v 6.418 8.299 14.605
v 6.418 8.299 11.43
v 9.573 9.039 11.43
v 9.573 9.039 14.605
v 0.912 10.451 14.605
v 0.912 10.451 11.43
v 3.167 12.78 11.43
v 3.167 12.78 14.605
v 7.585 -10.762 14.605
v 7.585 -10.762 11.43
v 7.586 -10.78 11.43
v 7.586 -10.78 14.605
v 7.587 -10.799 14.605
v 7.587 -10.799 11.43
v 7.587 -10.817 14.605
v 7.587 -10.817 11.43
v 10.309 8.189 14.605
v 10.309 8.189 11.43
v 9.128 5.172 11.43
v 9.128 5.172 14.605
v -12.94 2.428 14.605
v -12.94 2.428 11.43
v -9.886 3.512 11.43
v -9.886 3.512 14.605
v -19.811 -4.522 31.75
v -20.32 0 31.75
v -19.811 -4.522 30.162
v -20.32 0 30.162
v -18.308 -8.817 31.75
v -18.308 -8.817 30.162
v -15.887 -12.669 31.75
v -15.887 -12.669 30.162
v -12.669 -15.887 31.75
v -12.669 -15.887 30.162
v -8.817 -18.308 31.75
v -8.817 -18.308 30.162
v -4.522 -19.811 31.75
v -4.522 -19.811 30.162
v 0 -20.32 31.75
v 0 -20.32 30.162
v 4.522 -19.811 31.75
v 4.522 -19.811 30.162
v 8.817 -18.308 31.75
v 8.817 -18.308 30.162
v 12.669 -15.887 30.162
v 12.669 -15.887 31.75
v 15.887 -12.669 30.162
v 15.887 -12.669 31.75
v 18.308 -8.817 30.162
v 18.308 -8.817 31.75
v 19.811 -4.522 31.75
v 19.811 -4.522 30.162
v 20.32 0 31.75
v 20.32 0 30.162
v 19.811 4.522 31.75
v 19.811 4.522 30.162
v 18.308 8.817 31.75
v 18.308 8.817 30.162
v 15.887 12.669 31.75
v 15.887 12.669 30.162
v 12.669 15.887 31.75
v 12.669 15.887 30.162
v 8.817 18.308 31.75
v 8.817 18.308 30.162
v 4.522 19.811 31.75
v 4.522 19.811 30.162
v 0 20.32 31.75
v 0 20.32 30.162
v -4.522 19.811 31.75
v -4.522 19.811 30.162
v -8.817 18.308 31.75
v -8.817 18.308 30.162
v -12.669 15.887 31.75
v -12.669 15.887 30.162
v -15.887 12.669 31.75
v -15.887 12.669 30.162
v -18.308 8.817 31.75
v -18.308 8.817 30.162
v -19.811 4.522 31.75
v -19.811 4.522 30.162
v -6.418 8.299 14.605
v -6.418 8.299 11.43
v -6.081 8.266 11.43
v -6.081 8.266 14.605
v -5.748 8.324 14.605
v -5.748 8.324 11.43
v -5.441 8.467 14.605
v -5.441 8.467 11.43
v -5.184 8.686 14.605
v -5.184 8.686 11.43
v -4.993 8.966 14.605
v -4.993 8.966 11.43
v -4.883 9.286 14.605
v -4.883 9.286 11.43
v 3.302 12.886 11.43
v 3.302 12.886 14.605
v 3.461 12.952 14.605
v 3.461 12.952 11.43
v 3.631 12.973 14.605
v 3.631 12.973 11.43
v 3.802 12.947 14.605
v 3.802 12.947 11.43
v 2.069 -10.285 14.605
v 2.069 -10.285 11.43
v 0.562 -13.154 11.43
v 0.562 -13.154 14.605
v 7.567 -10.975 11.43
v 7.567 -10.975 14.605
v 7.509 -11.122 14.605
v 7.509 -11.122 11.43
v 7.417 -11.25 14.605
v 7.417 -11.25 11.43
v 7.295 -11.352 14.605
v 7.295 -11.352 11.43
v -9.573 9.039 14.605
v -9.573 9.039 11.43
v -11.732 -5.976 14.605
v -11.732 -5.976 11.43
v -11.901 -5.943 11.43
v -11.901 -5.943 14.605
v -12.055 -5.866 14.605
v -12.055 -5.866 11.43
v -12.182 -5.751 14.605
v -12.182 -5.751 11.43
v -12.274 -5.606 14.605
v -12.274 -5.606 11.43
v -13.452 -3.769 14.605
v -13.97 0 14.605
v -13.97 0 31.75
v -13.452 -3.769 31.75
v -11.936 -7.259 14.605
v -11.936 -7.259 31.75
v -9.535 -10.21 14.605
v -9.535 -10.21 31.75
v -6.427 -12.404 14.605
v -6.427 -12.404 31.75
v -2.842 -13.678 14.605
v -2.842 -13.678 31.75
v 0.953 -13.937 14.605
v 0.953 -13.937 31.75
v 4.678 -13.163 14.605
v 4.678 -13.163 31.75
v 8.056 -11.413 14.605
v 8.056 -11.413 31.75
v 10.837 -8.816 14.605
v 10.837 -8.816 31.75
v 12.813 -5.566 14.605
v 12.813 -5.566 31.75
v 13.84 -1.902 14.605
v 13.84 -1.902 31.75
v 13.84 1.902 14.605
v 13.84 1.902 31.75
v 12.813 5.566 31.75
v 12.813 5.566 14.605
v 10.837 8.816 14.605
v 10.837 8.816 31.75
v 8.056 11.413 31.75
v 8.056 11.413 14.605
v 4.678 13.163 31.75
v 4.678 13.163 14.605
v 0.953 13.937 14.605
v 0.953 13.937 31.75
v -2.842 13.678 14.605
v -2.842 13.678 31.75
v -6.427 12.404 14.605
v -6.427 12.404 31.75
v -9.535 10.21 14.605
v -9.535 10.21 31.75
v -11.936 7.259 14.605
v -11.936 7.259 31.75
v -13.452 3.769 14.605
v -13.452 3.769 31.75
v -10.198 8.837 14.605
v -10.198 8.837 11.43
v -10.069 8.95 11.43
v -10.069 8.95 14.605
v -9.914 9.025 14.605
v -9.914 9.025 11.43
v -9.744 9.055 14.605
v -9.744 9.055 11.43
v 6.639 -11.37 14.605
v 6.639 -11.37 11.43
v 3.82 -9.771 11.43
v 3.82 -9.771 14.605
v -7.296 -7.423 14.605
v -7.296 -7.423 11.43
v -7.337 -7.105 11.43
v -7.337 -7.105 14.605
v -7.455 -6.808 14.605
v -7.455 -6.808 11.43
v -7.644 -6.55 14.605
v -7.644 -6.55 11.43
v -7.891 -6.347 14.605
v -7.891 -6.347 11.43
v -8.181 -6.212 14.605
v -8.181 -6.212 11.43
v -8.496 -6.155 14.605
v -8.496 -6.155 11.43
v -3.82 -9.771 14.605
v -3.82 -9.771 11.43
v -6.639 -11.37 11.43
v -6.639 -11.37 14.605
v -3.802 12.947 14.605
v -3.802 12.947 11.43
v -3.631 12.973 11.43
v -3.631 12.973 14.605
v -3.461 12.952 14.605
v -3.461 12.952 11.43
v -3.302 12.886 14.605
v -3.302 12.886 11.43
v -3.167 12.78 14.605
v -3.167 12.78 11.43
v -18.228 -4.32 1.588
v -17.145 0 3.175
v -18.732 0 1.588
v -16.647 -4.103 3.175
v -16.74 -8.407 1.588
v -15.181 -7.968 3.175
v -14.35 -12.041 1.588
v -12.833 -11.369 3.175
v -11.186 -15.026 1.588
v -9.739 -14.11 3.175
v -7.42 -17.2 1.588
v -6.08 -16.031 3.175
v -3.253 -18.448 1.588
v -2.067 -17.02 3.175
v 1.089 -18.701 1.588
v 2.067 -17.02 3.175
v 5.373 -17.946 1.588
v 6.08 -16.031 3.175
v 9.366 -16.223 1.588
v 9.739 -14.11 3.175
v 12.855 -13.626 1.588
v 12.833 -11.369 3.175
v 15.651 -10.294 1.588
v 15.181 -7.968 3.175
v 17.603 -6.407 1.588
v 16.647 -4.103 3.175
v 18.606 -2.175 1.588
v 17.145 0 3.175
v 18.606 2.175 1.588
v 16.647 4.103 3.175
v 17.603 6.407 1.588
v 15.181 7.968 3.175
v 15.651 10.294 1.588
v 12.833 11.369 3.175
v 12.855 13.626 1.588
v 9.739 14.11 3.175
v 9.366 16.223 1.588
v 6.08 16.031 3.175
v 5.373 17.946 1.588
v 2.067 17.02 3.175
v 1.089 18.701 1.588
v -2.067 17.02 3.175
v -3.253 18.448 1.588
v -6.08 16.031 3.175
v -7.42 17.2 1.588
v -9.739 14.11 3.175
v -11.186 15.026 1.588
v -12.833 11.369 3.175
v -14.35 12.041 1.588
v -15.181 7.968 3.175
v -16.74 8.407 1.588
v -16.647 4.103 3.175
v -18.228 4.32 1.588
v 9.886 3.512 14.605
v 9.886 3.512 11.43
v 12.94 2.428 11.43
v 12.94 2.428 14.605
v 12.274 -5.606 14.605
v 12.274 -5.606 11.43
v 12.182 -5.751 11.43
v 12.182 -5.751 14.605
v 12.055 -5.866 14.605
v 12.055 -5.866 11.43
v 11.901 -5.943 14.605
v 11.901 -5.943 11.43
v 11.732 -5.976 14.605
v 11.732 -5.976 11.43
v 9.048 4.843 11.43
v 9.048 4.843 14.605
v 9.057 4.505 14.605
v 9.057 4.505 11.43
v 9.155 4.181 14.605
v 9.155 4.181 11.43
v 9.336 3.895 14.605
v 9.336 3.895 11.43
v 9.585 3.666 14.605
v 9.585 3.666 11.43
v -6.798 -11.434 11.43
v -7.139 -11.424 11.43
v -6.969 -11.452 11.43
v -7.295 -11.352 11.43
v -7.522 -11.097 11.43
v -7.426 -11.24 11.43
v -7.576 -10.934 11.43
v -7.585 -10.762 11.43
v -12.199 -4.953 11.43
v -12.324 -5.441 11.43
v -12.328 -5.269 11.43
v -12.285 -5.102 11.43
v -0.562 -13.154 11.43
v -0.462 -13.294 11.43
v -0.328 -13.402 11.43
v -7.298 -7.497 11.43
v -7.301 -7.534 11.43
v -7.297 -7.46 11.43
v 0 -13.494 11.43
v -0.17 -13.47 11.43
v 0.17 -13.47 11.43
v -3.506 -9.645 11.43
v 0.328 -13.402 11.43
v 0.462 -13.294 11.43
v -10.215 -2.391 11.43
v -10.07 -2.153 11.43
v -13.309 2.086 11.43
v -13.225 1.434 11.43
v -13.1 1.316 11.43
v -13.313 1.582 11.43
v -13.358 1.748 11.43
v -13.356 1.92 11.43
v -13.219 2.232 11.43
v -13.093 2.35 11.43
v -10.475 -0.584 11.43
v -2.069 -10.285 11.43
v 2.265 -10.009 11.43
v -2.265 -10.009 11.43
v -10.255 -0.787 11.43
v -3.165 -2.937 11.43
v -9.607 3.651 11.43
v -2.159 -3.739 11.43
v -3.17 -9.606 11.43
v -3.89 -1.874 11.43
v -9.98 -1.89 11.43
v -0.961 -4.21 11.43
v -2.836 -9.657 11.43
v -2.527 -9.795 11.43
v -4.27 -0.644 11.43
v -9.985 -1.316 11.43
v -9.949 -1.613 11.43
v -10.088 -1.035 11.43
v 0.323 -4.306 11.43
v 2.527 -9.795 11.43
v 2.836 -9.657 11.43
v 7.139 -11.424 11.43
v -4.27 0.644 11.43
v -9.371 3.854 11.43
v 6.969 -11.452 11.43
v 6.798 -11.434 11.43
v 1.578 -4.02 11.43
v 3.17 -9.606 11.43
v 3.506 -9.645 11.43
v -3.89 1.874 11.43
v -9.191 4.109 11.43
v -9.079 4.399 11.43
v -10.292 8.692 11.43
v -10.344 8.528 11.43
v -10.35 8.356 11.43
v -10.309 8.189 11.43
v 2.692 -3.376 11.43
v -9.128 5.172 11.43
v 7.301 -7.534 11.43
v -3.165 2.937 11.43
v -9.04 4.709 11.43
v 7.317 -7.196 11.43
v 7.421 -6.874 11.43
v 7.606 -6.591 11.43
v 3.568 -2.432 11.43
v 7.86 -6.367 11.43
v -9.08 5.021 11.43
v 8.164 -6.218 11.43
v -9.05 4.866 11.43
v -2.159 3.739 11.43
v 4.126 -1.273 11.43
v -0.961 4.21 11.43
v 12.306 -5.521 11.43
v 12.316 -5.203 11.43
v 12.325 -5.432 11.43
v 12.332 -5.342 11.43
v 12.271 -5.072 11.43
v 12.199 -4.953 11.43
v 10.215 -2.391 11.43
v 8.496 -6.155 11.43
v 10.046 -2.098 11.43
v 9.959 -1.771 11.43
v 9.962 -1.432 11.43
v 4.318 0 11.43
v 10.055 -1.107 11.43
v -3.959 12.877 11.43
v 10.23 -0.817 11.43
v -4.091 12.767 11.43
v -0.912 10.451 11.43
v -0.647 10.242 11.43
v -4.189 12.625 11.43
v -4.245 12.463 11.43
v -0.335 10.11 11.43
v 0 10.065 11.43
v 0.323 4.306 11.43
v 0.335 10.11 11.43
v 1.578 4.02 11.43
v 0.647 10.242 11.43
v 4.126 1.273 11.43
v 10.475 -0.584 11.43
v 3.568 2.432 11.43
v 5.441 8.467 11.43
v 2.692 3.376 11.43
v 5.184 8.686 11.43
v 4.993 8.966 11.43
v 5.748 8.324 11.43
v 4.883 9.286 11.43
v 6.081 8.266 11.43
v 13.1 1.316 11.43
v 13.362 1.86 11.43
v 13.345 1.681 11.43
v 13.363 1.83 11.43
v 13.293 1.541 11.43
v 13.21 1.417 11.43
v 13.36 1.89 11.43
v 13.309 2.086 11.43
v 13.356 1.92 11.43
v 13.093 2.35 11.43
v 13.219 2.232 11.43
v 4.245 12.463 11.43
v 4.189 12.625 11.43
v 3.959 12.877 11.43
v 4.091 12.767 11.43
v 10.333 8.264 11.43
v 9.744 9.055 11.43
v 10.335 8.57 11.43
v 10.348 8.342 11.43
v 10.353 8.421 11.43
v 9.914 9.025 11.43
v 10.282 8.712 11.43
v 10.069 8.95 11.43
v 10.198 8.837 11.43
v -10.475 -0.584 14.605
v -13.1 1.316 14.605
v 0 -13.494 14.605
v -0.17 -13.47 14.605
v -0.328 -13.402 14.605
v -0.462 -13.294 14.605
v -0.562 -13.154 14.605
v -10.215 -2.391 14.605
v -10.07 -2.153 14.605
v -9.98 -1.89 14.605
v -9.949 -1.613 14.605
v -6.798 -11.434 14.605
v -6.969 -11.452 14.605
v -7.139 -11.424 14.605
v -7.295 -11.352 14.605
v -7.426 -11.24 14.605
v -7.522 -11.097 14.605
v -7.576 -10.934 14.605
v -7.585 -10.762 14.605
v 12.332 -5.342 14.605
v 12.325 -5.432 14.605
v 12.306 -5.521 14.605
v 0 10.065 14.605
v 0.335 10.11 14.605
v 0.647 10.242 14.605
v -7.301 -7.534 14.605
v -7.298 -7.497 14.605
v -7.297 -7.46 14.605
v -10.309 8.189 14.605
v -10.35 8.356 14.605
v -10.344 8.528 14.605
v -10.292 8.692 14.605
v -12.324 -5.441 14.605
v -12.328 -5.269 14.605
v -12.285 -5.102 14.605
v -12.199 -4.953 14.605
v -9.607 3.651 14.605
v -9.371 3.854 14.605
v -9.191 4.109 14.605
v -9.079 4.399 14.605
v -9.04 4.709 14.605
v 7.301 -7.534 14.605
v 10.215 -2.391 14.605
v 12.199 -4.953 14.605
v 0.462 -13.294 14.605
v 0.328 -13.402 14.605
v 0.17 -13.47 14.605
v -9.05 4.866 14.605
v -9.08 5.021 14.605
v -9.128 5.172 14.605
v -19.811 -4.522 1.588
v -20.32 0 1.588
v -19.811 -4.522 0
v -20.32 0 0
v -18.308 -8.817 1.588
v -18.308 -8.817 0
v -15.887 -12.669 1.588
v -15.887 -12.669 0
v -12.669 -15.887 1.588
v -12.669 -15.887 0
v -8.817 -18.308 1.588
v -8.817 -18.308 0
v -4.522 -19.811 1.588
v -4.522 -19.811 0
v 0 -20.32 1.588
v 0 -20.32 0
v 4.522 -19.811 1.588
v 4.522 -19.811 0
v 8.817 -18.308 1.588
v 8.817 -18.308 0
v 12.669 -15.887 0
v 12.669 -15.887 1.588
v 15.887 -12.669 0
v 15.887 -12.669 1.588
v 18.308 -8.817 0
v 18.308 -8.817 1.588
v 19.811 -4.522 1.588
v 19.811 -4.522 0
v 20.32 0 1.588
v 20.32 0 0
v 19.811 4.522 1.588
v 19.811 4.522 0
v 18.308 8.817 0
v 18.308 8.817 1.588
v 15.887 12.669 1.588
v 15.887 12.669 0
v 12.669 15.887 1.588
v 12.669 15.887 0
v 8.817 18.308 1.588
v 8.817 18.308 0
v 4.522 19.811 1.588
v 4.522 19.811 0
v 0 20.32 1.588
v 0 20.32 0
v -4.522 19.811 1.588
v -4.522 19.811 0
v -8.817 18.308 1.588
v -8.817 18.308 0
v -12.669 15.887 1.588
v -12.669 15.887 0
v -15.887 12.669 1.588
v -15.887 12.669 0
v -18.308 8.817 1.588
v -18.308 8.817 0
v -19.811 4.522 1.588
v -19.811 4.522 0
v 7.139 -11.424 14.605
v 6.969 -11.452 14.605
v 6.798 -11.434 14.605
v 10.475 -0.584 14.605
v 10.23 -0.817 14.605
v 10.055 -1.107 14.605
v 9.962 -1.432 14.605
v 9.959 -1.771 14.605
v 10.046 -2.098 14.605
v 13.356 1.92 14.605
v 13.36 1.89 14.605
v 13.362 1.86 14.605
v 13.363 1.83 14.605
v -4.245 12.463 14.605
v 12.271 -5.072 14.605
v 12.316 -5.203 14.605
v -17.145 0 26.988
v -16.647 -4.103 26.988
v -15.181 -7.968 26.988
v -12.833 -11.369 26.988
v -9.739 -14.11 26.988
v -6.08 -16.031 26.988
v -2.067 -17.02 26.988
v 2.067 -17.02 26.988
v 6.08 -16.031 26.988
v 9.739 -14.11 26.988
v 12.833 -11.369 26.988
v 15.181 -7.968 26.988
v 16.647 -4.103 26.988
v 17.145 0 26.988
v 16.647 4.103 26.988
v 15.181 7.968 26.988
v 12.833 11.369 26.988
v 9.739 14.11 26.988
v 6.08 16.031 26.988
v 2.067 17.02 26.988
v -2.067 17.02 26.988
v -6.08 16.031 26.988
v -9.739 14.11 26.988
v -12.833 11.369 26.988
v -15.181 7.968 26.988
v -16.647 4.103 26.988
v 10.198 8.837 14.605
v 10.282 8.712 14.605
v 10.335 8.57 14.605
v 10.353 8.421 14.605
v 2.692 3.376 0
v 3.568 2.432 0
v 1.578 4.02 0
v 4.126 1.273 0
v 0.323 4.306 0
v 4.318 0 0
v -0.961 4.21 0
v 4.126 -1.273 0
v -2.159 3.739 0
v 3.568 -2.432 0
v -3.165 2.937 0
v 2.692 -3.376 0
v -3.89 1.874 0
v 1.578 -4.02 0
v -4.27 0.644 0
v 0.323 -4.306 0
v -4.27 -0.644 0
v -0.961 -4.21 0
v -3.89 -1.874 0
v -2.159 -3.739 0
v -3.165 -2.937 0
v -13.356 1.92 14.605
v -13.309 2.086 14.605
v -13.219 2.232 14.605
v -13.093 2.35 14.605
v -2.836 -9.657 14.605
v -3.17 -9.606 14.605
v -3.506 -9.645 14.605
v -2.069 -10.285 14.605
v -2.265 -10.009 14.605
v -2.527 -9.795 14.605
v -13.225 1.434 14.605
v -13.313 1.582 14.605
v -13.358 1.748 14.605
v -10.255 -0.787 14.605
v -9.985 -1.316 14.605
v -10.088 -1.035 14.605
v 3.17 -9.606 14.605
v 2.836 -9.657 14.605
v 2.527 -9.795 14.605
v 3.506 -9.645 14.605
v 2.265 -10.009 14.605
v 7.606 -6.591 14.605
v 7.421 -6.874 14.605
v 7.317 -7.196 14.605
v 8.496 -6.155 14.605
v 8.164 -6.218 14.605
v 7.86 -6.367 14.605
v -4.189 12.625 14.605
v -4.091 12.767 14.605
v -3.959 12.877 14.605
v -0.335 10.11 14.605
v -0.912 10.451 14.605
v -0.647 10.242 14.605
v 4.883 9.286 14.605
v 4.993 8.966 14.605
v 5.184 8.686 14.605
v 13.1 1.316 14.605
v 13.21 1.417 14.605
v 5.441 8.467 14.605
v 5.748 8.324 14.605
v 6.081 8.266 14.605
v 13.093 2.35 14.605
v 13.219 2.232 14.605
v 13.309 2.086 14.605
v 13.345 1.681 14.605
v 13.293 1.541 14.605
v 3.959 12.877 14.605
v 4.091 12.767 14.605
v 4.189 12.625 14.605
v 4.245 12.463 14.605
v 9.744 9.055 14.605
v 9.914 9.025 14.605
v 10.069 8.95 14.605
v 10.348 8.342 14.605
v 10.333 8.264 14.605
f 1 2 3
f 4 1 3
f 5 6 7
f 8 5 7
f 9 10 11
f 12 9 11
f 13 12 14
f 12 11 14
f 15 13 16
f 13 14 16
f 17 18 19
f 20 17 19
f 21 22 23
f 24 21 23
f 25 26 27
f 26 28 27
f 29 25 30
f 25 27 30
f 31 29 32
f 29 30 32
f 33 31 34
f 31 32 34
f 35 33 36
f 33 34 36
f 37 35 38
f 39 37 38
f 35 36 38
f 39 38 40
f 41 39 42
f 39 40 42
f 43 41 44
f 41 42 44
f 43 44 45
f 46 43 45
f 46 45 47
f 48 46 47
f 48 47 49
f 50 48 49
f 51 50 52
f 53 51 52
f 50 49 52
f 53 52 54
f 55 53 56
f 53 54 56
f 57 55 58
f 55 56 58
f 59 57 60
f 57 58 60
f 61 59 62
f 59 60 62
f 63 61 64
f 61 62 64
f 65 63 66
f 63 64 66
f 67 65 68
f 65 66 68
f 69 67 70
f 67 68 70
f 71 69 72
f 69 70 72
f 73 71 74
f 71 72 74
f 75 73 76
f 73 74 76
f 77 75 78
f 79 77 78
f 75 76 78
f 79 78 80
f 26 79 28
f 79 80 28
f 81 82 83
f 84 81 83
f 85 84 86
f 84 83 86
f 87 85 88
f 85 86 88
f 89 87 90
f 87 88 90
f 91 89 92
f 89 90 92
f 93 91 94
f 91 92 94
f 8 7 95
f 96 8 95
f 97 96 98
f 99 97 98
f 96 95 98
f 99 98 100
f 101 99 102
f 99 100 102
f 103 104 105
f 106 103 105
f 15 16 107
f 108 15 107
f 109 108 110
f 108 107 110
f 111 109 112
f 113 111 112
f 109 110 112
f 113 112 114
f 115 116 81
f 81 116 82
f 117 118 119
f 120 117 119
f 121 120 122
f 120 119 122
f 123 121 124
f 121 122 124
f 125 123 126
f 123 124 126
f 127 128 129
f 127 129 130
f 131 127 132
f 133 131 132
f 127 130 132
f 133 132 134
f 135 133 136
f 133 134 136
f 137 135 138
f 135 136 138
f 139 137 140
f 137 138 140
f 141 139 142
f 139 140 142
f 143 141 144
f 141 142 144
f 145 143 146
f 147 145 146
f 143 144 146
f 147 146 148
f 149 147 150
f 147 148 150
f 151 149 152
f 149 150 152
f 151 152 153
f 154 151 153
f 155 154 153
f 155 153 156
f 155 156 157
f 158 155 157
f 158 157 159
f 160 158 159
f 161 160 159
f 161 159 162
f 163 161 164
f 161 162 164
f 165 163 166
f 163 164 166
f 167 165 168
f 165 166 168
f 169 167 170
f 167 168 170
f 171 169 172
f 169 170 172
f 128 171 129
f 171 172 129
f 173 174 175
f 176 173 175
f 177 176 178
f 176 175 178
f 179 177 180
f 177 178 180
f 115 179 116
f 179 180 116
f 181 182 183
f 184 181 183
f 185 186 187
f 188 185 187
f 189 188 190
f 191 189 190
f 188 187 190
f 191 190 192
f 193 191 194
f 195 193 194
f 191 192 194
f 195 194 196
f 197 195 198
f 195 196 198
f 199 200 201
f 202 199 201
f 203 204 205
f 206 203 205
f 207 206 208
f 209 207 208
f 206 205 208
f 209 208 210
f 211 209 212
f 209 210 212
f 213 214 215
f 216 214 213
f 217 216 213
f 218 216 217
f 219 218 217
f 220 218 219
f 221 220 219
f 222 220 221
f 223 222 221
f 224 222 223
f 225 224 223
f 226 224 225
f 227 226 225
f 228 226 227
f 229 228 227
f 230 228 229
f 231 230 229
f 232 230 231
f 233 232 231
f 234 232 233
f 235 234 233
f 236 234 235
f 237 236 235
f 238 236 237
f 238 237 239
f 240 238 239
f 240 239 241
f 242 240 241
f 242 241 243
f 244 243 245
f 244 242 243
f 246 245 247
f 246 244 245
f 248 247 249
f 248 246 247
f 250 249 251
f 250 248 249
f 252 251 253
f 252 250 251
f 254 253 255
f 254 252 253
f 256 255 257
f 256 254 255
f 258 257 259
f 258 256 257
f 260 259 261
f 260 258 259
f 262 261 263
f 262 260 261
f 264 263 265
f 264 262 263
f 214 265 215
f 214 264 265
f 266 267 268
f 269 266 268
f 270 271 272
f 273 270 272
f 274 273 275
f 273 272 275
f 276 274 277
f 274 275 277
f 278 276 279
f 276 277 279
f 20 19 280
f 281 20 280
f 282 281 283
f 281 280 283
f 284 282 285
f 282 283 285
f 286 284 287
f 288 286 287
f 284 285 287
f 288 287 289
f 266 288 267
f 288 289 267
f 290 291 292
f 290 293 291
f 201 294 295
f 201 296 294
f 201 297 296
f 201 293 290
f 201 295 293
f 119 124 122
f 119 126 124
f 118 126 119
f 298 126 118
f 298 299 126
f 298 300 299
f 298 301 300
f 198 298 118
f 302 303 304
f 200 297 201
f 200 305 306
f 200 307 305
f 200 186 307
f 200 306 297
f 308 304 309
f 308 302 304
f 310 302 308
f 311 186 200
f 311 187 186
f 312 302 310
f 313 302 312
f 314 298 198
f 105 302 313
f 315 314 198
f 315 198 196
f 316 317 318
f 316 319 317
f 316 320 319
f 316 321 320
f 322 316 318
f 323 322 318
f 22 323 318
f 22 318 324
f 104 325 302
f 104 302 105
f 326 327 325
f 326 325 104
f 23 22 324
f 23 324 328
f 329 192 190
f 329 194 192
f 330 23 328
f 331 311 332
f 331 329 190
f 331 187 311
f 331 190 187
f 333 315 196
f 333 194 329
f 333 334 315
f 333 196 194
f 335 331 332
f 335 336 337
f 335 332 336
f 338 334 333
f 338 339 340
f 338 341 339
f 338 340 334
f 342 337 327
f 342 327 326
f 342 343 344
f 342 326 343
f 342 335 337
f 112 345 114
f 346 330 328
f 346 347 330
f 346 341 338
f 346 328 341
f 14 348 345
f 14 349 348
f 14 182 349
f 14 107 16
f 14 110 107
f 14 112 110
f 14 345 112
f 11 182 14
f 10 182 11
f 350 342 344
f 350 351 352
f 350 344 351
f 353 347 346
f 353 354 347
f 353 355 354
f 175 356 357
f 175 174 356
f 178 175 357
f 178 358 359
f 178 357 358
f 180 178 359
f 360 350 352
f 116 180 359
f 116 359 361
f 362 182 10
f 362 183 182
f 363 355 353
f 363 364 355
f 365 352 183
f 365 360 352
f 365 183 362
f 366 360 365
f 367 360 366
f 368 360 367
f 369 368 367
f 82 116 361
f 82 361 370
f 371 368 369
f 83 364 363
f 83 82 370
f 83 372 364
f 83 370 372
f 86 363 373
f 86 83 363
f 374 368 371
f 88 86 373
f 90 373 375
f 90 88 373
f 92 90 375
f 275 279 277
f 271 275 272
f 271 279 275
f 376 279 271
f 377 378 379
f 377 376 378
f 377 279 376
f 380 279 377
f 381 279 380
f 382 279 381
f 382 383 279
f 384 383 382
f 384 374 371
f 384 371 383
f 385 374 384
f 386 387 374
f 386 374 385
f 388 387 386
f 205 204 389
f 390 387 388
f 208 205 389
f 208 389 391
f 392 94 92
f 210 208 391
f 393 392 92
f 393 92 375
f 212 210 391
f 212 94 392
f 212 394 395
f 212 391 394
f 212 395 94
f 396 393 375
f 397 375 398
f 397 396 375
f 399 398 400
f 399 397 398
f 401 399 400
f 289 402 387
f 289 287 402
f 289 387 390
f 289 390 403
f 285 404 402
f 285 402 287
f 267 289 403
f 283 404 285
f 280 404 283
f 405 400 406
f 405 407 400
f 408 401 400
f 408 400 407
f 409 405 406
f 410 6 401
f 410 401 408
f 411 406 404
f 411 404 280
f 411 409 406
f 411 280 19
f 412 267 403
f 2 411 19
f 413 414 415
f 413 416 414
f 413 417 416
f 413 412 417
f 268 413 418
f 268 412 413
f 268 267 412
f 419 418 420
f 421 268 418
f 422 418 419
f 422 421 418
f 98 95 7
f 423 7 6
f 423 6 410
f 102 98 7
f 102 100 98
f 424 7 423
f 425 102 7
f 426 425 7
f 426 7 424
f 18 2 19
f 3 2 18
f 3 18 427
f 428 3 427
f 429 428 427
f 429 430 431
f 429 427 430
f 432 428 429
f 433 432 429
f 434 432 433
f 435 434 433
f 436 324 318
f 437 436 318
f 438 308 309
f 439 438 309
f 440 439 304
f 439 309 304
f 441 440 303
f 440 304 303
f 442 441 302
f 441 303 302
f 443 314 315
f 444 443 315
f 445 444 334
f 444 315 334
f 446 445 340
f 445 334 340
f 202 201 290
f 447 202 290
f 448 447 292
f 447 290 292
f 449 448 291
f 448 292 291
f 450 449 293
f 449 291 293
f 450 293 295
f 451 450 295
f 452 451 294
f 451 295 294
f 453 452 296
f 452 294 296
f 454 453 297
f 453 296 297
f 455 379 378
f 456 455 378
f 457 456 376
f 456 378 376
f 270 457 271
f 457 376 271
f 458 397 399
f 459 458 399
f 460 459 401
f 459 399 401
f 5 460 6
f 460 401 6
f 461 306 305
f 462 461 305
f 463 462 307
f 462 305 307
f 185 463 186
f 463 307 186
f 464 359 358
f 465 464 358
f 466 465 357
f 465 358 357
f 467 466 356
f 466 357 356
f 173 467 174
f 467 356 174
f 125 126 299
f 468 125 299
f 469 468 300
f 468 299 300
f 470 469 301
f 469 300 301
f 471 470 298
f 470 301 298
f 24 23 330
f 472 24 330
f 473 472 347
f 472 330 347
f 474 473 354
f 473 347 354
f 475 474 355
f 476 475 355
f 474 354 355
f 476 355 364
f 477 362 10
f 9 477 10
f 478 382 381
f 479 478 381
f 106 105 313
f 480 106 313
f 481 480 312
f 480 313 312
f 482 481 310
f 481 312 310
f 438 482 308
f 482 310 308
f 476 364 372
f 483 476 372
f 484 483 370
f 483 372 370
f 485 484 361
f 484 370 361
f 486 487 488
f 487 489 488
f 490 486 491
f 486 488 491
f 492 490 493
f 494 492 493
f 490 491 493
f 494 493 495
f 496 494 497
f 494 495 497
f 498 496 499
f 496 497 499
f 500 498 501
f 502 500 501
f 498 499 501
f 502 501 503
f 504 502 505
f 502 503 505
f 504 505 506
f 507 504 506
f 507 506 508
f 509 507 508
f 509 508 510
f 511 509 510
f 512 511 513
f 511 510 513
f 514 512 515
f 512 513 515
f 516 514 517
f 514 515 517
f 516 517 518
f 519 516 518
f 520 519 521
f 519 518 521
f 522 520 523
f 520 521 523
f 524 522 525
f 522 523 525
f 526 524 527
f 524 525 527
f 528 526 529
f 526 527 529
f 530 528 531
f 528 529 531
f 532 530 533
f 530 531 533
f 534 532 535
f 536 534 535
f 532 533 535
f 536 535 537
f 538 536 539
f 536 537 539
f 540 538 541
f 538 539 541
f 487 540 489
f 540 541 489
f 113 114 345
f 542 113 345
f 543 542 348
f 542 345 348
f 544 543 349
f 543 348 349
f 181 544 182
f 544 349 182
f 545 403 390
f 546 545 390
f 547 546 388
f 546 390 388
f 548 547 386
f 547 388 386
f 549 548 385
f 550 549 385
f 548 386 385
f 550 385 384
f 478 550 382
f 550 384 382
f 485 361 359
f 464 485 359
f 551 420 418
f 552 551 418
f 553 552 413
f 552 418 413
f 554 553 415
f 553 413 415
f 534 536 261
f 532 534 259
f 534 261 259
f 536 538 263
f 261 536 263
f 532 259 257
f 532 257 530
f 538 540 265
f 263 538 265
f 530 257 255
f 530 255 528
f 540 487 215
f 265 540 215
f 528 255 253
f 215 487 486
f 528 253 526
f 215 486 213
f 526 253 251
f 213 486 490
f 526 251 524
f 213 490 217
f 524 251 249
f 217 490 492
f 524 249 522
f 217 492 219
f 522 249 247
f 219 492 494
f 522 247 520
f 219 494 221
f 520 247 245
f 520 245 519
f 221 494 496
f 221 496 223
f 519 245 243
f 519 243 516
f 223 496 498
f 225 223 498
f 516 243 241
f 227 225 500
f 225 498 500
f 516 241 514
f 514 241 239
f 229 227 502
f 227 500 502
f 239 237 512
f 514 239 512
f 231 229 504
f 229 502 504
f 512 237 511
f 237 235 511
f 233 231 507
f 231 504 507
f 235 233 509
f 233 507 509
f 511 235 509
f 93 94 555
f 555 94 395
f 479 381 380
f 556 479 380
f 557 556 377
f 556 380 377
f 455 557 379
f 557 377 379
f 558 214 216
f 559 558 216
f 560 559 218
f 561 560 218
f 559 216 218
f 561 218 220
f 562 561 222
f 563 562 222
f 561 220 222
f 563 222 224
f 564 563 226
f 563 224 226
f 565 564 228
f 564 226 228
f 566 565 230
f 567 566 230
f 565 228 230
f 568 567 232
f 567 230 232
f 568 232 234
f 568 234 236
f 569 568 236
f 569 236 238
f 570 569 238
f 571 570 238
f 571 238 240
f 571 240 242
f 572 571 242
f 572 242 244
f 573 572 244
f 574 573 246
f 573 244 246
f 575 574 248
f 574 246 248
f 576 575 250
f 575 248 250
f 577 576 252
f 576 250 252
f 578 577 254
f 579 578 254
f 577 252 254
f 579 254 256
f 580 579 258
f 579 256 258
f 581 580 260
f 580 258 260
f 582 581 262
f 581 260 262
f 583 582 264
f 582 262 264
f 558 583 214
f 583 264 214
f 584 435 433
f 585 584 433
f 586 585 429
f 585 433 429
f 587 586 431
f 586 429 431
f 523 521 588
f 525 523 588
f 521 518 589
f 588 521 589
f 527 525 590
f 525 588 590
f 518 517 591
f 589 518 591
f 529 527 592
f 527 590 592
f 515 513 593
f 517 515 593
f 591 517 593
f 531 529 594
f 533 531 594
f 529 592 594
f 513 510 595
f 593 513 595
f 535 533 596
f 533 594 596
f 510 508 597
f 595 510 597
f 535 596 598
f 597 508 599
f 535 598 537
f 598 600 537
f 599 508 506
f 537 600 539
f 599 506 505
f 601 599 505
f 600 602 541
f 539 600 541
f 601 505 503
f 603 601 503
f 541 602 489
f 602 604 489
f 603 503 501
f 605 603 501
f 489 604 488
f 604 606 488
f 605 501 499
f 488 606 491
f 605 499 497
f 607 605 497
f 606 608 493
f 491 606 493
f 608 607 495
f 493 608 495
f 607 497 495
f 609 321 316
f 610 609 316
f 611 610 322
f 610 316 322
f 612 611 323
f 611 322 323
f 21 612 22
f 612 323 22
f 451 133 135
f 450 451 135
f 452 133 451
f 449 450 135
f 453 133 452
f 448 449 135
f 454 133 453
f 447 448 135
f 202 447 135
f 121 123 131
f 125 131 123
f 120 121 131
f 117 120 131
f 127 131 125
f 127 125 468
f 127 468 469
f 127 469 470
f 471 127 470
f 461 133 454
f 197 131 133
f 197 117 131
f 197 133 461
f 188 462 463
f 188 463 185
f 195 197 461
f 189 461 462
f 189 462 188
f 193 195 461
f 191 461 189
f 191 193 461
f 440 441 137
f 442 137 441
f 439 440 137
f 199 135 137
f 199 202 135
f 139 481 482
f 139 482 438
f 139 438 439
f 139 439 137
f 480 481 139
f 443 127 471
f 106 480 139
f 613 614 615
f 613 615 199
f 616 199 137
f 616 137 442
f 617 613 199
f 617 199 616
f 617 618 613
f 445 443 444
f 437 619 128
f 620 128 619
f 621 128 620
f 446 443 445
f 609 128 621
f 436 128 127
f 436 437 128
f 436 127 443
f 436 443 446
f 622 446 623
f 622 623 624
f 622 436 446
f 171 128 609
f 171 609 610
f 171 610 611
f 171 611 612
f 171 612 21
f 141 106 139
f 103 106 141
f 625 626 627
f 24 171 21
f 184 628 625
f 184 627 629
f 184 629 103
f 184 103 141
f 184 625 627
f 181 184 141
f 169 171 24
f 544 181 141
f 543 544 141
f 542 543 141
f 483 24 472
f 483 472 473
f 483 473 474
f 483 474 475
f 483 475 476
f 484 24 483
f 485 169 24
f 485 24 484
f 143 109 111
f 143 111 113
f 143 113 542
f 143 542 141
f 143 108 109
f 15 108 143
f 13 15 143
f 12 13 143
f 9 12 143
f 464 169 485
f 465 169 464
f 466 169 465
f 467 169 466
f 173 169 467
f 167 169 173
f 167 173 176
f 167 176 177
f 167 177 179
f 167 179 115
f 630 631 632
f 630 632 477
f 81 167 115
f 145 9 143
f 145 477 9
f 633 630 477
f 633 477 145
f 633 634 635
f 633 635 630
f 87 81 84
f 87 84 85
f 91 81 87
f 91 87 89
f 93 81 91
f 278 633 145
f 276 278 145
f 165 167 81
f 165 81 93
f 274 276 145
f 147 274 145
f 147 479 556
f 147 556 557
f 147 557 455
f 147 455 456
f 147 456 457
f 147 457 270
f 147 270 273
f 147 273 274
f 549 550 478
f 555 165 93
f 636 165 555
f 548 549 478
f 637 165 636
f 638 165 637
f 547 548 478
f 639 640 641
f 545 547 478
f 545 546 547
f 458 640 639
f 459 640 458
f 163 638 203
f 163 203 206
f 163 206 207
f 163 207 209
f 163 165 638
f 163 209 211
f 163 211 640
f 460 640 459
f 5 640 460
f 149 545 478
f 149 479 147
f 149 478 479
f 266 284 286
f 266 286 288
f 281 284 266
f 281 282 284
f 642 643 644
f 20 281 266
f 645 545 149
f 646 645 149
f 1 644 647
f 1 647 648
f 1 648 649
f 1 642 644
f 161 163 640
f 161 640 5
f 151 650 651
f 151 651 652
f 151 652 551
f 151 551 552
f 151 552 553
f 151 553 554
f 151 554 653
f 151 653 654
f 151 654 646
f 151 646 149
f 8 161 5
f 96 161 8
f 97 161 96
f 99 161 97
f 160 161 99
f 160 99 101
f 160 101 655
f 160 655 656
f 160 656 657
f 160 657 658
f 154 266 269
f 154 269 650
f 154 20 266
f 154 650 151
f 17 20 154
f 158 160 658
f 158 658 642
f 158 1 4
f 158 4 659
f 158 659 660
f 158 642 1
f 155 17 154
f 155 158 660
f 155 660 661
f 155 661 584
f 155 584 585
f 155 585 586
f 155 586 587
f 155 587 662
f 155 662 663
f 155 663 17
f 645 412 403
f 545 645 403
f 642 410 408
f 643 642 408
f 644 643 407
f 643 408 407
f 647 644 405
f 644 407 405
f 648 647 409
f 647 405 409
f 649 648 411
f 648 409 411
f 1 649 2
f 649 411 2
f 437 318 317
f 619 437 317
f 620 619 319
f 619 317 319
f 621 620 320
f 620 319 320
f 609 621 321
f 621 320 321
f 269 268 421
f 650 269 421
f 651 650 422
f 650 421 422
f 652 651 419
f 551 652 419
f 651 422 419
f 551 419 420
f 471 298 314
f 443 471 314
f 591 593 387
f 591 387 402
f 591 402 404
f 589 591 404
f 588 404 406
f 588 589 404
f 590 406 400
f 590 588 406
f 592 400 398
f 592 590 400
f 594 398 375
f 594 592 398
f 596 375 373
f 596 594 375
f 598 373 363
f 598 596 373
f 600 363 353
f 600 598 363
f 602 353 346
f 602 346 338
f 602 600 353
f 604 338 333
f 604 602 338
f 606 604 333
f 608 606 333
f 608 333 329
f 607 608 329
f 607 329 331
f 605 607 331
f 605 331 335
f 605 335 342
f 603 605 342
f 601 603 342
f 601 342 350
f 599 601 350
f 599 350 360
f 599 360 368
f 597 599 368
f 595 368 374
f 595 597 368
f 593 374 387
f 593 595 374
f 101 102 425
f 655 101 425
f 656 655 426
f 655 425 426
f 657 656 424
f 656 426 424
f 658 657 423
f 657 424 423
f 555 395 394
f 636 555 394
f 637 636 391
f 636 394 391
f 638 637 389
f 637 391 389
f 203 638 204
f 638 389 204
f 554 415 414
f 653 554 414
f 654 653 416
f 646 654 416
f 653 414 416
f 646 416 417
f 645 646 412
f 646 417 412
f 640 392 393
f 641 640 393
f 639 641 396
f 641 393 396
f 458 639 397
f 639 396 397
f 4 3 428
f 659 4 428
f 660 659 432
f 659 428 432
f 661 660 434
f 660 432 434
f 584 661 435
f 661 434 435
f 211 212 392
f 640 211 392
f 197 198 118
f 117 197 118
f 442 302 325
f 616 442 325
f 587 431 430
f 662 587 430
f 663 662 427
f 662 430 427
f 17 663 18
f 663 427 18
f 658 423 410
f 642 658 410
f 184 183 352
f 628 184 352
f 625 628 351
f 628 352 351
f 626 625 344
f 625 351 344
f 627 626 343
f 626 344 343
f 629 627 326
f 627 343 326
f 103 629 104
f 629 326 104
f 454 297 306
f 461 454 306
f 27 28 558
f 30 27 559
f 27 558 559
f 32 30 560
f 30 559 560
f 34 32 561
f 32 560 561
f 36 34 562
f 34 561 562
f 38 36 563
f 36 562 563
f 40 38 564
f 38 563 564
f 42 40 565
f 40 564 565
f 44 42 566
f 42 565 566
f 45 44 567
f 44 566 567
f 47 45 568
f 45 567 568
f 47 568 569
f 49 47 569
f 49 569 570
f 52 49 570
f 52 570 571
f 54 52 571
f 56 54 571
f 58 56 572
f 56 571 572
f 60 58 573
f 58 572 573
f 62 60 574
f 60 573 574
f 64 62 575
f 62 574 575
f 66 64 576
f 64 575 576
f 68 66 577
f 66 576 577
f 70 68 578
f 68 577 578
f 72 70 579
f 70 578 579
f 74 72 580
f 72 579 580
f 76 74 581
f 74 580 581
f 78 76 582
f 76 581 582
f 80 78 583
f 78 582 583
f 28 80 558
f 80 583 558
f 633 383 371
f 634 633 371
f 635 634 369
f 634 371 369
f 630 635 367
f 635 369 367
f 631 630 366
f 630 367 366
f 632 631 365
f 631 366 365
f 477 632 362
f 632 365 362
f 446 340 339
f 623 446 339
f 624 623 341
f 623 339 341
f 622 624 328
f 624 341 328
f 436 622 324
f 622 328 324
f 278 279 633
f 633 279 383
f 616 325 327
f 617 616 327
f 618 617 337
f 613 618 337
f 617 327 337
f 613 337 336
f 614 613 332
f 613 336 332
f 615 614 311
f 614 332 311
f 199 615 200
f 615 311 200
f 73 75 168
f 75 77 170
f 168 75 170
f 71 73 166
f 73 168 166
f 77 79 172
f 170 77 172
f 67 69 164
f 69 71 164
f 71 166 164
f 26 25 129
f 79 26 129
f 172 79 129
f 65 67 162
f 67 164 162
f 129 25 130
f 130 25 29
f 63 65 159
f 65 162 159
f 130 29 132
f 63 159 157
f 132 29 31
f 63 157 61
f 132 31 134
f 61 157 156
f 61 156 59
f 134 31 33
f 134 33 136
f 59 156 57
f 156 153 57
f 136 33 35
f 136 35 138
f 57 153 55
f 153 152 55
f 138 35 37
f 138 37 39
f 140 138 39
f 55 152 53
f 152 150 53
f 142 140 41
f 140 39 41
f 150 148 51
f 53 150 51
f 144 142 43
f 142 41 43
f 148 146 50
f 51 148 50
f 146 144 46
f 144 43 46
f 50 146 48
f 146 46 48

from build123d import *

# Parameters (mm, degrees)
F0_R     = 15.875
F0_R_2   = 4.318
F1_DEPTH = 11.43
F5_SIZE  = 1.5875
F4_R     = 15.875
F4_R_2   = 13.97
F6_DEPTH = 3.175


with BuildPart() as f1:
    # F0 (on Top) → F1 (new body)
    with BuildSketch(Plane.XY):
        Circle(F0_R)
        Circle(F0_R_2, mode=Mode.SUBTRACT)
    extrude(amount=F1_DEPTH)

    # F2 (on Front) → F3 (revolve)
    with BuildSketch(Plane.XZ):
        Polygon((-20.32, 0), (-10.16, 0), (-10.16, 1.5875), (-13.97, 1.5875), (-13.97, 31.75), (-20.32, 31.75), (-20.32, 30.1625), (-17.145, 30.1625), (-17.145, 26.9875), (-17.145, 1.5875), (-20.32, 1.5875), align=None)
        Polygon((-20.32, 30.1625), (-17.145, 26.9875), (-17.145, 30.1625), align=None)
    revolve(axis=Axis((0, 0, 11.5776285529), (0, 0, 1)))

    # F5
    f5_edges = [f1.edges().sort_by_distance(p)[0] for p in [
        (17.145, 0, 1.5875),
    ]]
    chamfer(f5_edges, length=F5_SIZE)

    # F4 (on face) → F6 (join)
    with BuildSketch(Plane.XY.offset(11.43)):
        Circle(F4_R)
        Circle(F4_R_2, mode=Mode.SUBTRACT)
        Circle(F4_R_2)
        with BuildLine():
            ThreePointArc((0, 13.49375), (1.9203608066, 13.3564030875), (3.8016286067, 12.9471583368))
            ThreePointArc((3.8016286067, 12.9471583368), (7.2952719665, 11.3516648998), (10.1978957754, 8.836527079))
            ThreePointArc((10.1978957754, 8.836527079), (12.2743466965, 5.6055064211), (13.3564030629, 1.9203609777))
            ThreePointArc((13.3564030629, 1.9203609777), (13.4593694669, 0.9626331682), (13.49375, 0))
            ThreePointArc((13.49375, 0), (13.1853755264, -2.8683028589), (12.2743467518, -5.6055063))
            ThreePointArc((12.2743467518, -5.6055063), (10.197895881, -8.836526957), (7.2952721608, -11.3516647749))
            ThreePointArc((7.2952721608, -11.3516647749), (3.8016288023, -12.9471582794), (8.16e-08, -13.49375))
            ThreePointArc((8.16e-08, -13.49375), (-3.8016286419, -12.9471583265), (-7.2952720168, -11.3516648675))
            ThreePointArc((-7.2952720168, -11.3516648675), (-10.1978957807, -8.8365270728), (-12.2743466957, -5.6055064229))
            ThreePointArc((-12.2743466957, -5.6055064229), (-13.3564030713, -1.920360919), (-13.3564030873, 1.9203608081))
            ThreePointArc((-13.3564030873, 1.9203608081), (-12.2743467595, 5.6055062831), (-10.1978958619, 8.8365269791))
            ThreePointArc((-10.1978958619, 8.8365269791), (-7.2952721155, 11.3516648041), (-3.8016288198, 12.9471582743))
            ThreePointArc((-3.8016288198, 12.9471582743), (-1.9203609165, 13.3564030717), (0, 13.49375))
        make_face(mode=Mode.SUBTRACT)
        with BuildLine():
            ThreePointArc((10.1978957754, 8.836527079), (7.2952719665, 11.3516648998), (3.8016286067, 12.9471583368))
            ThreePointArc((3.8016286067, 12.9471583368), (4.0909657389, 12.766807831), (4.2453187505, 12.462805481))
            Line((4.2453187505, 12.462805481), (4.8828478786, 9.2855481142))
            ThreePointArc((4.8828478786, 9.2855481142), (6.002488465, 10.799178406), (7.3980285057, 9.5353984813))
            ThreePointArc((7.3980285057, 9.5353984813), (7.1233157795, 8.7465364892), (6.4180233992, 8.2989507623))
            Line((6.4180233992, 8.2989507623), (9.572997339, 9.0389143838))
            ThreePointArc((9.572997339, 9.0389143838), (9.9136481809, 9.0247970952), (10.1978957754, 8.836527079))
        make_face()
        with BuildLine():
            ThreePointArc((13.3564030629, 1.9203609777), (12.2743466965, 5.6055064211), (10.1978957754, 8.836527079))
            ThreePointArc((10.1978957754, 8.836527079), (10.3129578638, 8.6426002713), (10.3529947858, 8.4206905243))
            ThreePointArc((10.3529947858, 8.4206905243), (10.3419731231, 8.302893943), (10.3092907399, 8.1891865402))
            Line((10.3092907399, 8.1891865402), (9.1278593511, 5.1716332867))
            ThreePointArc((9.1278593511, 5.1716332867), (10.5460444219, 5.9565819932), (11.5804512593, 4.7086253186))
            ThreePointArc((11.5804512593, 4.7086253186), (11.0431742993, 3.6713129516), (9.8859363825, 3.5116762306))
            Line((9.8859363825, 3.5116762306), (12.9401238926, 2.4284655514))
            ThreePointArc((12.9401238926, 2.4284655514), (13.2190652142, 2.2324196075), (13.3564030629, 1.9203609777))
        make_face()
        with BuildLine():
            ThreePointArc((-4.2453189127, 12.4628054073), (-4.090965925, 12.7668077529), (-3.8016288198, 12.9471582743))
            ThreePointArc((-3.8016288198, 12.9471582743), (-7.2952721155, 11.3516648041), (-10.1978958619, 8.8365269791))
            ThreePointArc((-10.1978958619, 8.8365269791), (-9.9136482865, 9.0247969722), (-9.5729974735, 9.0389142669))
            Line((-9.5729974735, 9.0389142669), (-6.4180233441, 8.2989507494))
            ThreePointArc((-6.4180233441, 8.2989507494), (-6.9168905199, 10.5306857375), (-4.8580285057, 9.5353984813))
            ThreePointArc((-4.8580285057, 9.5353984813), (-4.8642485781, 9.4098584688), (-4.8828478674, 9.2855481697))
            Line((-4.8828478674, 9.2855481697), (-4.2453189127, 12.4628054073))
        make_face()
        with BuildLine():
            ThreePointArc((13.49375, 0), (13.4593694669, 0.9626331682), (13.3564030629, 1.9203609777))
            ThreePointArc((13.3564030629, 1.9203609777), (13.3612485452, 1.8752914129), (13.3628664542, 1.8299910074))
            ThreePointArc((13.3628664542, 1.8299910074), (13.2933821525, 1.541171003), (13.1001357613, 1.315558735))
            Line((13.1001357613, 1.315558735), (10.474839974, -0.5842385682))
            ThreePointArc((10.474839974, -0.5842385682), (11.7970185973, -0.4820717165), (12.4893785884, -1.6131031131))
            ThreePointArc((12.4893785884, -1.6131031131), (11.6301765314, -2.8148289762), (10.2151344151, -2.390530692))
            Line((10.2151344151, -2.390530692), (12.1988525408, -4.9530039347))
            ThreePointArc((12.1988525408, -4.9530039347), (12.2975933857, -5.1363187527), (12.3317304542, -5.3417177242))
            ThreePointArc((12.3317304542, -5.3417177242), (12.3172187091, -5.4766967059), (12.2743467518, -5.6055063))
            ThreePointArc((12.2743467518, -5.6055063), (13.1853755264, -2.8683028589), (13.49375, 0))
        make_face()
        with BuildLine():
            ThreePointArc((-10.3092908365, 8.1891863905), (-10.3437969109, 8.5283789982), (-10.1978958619, 8.8365269791))
            ThreePointArc((-10.1978958619, 8.8365269791), (-12.2743467595, 5.6055062831), (-13.3564030873, 1.9203608081))
            ThreePointArc((-13.3564030873, 1.9203608081), (-13.219065249, 2.2324194318), (-12.9401239425, 2.4284653804))
            Line((-12.9401239425, 2.4284653804), (-9.8859363292, 3.5116762495))
            ThreePointArc((-9.8859363292, 3.5116762495), (-11.4656839052, 5.2362023594), (-9.1278593717, 5.1716333395))
            Line((-9.1278593717, 5.1716333395), (-10.3092908365, 8.1891863905))
        make_face()
        with BuildLine():
            ThreePointArc((-13.1001357616, 1.3155585568), (-13.3125454921, 1.5822501552), (-13.3564030873, 1.9203608081))
            ThreePointArc((-13.3564030873, 1.9203608081), (-13.3564030713, -1.920360919), (-12.2743466957, -5.6055064229))
            ThreePointArc((-12.2743466957, -5.6055064229), (-12.3275224114, -5.2687355378), (-12.1988524903, -4.9530041056))
            Line((-12.1988524903, -4.9530041056), (-10.2151343804, -2.3905306473))
            ThreePointArc((-10.2151343804, -2.3905306473), (-12.4764518155, -1.7938429858), (-10.4748400199, -0.584238535))
            Line((-10.4748400199, -0.584238535), (-13.1001357616, 1.3155585568))
        make_face()
        with BuildLine():
            ThreePointArc((7.2952721608, -11.3516647749), (10.197895881, -8.836526957), (12.2743467518, -5.6055063))
            ThreePointArc((12.2743467518, -5.6055063), (12.054654987, -5.8662318125), (11.7317802397, -5.9757496733))
            Line((11.7317802397, -5.9757496733), (8.4961329169, -6.1546188058))
            ThreePointArc((8.4961329169, -6.1546188058), (9.439122385, -6.5002060227), (9.8362324879, -7.4226827041))
            ThreePointArc((9.8362324879, -7.4226827041), (8.6218249278, -8.6914653808), (7.3010994475, -7.5337610106))
            Line((7.3010994475, -7.5337610106), (7.5845317003, -10.7619296679))
            ThreePointArc((7.5845317003, -10.7619296679), (7.5863565184, -10.7896726012), (7.5869651801, -10.8174688212))
            ThreePointArc((7.5869651801, -10.8174688212), (7.509291356, -11.1217918956), (7.2952721608, -11.3516647749))
        make_face()
        with BuildLine():
            ThreePointArc((-11.7317801436, -5.9757498234), (-12.0546549192, -5.866231961), (-12.2743466957, -5.6055064229))
            ThreePointArc((-12.2743466957, -5.6055064229), (-10.1978957807, -8.8365270728), (-7.2952720168, -11.3516648675))
            ThreePointArc((-7.2952720168, -11.3516648675), (-7.52207831, -11.0971041407), (-7.5845315655, -10.7619297844))
            Line((-7.5845315655, -10.7619297844), (-7.3010994426, -7.5337609542))
            ThreePointArc((-7.3010994426, -7.5337609542), (-9.5260344288, -8.2543558576), (-8.4961329734, -6.1546188027))
            Line((-8.4961329734, -6.1546188027), (-11.7317801436, -5.9757498234))
        make_face()
        with BuildLine():
            ThreePointArc((8.16e-08, -13.49375), (3.8016288023, -12.9471582794), (7.2952721608, -11.3516647749))
            ThreePointArc((7.2952721608, -11.3516647749), (6.9694967924, -11.4522267613), (6.6386673847, -11.369799783))
            Line((6.6386673847, -11.369799783), (3.8199636894, -9.770951059))
            ThreePointArc((3.8199636894, -9.770951059), (4.2907915357, -10.2364245911), (4.4633680987, -10.8756129827))
            ThreePointArc((4.4633680987, -10.8756129827), (2.8892512665, -12.1086632462), (2.0690169925, -10.2850754393))
            Line((2.0690169925, -10.2850754393), (0.5621756347, -13.1540187717))
            ThreePointArc((0.5621756347, -13.1540187717), (0.3284276459, -13.4022206386), (8.16e-08, -13.49375))
        make_face()
        with BuildLine():
            ThreePointArc((-6.6386672228, -11.3697998573), (-6.969496637, -11.4522268501), (-7.2952720168, -11.3516648675))
            ThreePointArc((-7.2952720168, -11.3516648675), (-3.8016286419, -12.9471583265), (8.16e-08, -13.49375))
            ThreePointArc((8.16e-08, -13.49375), (-0.3284274706, -13.4022206459), (-0.5621754583, -13.1540187967))
            Line((-0.5621754583, -13.1540187967), (-2.0690170188, -10.2850753892))
            ThreePointArc((-2.0690170188, -10.2850753892), (-1.9603178419, -10.571496123), (-1.9233680987, -10.8756129827))
            ThreePointArc((-1.9233680987, -10.8756129827), (-3.8325564657, -11.973036434), (-3.8199637387, -9.7709510869))
            Line((-3.8199637387, -9.7709510869), (-6.6386672228, -11.3697998573))
        make_face()
        with BuildLine():
            ThreePointArc((7.3980285057, 9.5353984813), (6.002488465, 10.799178406), (4.8828478786, 9.2855481142))
            ThreePointArc((4.8828478786, 9.2855481142), (5.4414146913, 8.4670064793), (6.4180233992, 8.2989507623))
            ThreePointArc((6.4180233992, 8.2989507623), (7.1233157795, 8.7465364892), (7.3980285057, 9.5353984813))
        make_face()
        with BuildLine():
            ThreePointArc((-6.4180233441, 8.2989507494), (-5.4414146437, 8.4670065099), (-4.8828478674, 9.2855481697))
            ThreePointArc((-4.8828478674, 9.2855481697), (-4.8642485781, 9.4098584688), (-4.8580285057, 9.5353984813))
            ThreePointArc((-4.8580285057, 9.5353984813), (-6.9168905199, 10.5306857375), (-6.4180233441, 8.2989507494))
        make_face()
        with BuildLine():
            ThreePointArc((9.1278593511, 5.1716332867), (9.155218637, 4.1810482264), (9.8859363825, 3.5116762306))
            ThreePointArc((9.8859363825, 3.5116762306), (11.0431742993, 3.6713129516), (11.5804512593, 4.7086253186))
            ThreePointArc((11.5804512593, 4.7086253186), (10.5460444219, 5.9565819932), (9.1278593511, 5.1716332867))
        make_face()
        with BuildLine():
            ThreePointArc((-9.0404512593, 4.7086253186), (-9.06249459, 4.944218509), (-9.1278593717, 5.1716333395))
            ThreePointArc((-9.1278593717, 5.1716333395), (-11.4656839052, 5.2362023594), (-9.8859363292, 3.5116762495))
            ThreePointArc((-9.8859363292, 3.5116762495), (-9.273138876, 3.9759023018), (-9.0404512593, 4.7086253186))
        make_face()
        with BuildLine():
            ThreePointArc((12.4893785884, -1.6131031131), (11.7970185973, -0.4820717165), (10.474839974, -0.5842385682))
            ThreePointArc((10.474839974, -0.5842385682), (9.9623053531, -1.4323632965), (10.2151344151, -2.390530692))
            ThreePointArc((10.2151344151, -2.390530692), (11.6301765314, -2.8148289762), (12.4893785884, -1.6131031131))
        make_face()
        with BuildLine():
            ThreePointArc((-9.9493785884, -1.6131031131), (-10.0883472046, -1.035463079), (-10.4748400199, -0.584238535))
            ThreePointArc((-10.4748400199, -0.584238535), (-12.4764518155, -1.7938429858), (-10.2151343804, -2.3905306473))
            ThreePointArc((-10.2151343804, -2.3905306473), (-10.0176527161, -2.0239010293), (-9.9493785884, -1.6131031131))
        make_face()
        with BuildLine():
            ThreePointArc((9.8362324879, -7.4226827041), (9.439122385, -6.5002060227), (8.4961329169, -6.1546188058))
            ThreePointArc((8.4961329169, -6.1546188058), (7.6064305099, -6.5910095934), (7.3010994475, -7.5337610106))
            ThreePointArc((7.3010994475, -7.5337610106), (8.6218249278, -8.6914653808), (9.8362324879, -7.4226827041))
        make_face()
        with BuildLine():
            ThreePointArc((-7.2962324879, -7.4226827041), (-7.643755826, -6.5497927865), (-8.4961329734, -6.1546188027))
            ThreePointArc((-8.4961329734, -6.1546188027), (-9.5260344288, -8.2543558576), (-7.3010994426, -7.5337609542))
            ThreePointArc((-7.3010994426, -7.5337609542), (-7.29744981, -7.4782751157), (-7.2962324879, -7.4226827041))
        make_face()
        with BuildLine():
            ThreePointArc((4.4633680987, -10.8756129827), (4.2907915357, -10.2364245911), (3.8199636894, -9.770951059))
            ThreePointArc((3.8199636894, -9.770951059), (2.8355677243, -9.6570569142), (2.0690169925, -10.2850754393))
            ThreePointArc((2.0690169925, -10.2850754393), (2.8892512665, -12.1086632462), (4.4633680987, -10.8756129827))
        make_face()
        with BuildLine():
            ThreePointArc((-2.0690170188, -10.2850753892), (-2.8355677786, -9.6570568982), (-3.8199637387, -9.7709510869))
            ThreePointArc((-3.8199637387, -9.7709510869), (-3.8325564657, -11.973036434), (-1.9233680987, -10.8756129827))
            ThreePointArc((-1.9233680987, -10.8756129827), (-1.9603178419, -10.571496123), (-2.0690170188, -10.2850753892))
        make_face()
        with BuildLine():
            ThreePointArc((3.1665117699, 12.7795717652), (3.4607178673, 12.9518652935), (3.8016286067, 12.9471583368))
            ThreePointArc((3.8016286067, 12.9471583368), (1.9203608066, 13.3564030875), (0, 13.49375))
            Line((0, 13.49375), (0, 12.60475))
            ThreePointArc((0, 12.60475), (0.8980256121, 12.2327756121), (1.27, 11.33475))
            ThreePointArc((1.27, 11.33475), (1.177219252, 10.8582472899), (0.9124333342, 10.4513670646))
            Line((0.9124333342, 10.4513670646), (3.1665117699, 12.7795717652))
        make_face()
        with BuildLine():
            Line((0, 12.60475), (0, 13.49375))
            ThreePointArc((0, 13.49375), (-1.9203609165, 13.3564030717), (-3.8016288198, 12.9471582743))
            ThreePointArc((-3.8016288198, 12.9471582743), (-3.4607180661, 12.9518652586), (-3.1665119462, 12.7795717395))
            Line((-3.1665119462, 12.7795717395), (-0.9124332948, 10.4513670239))
            ThreePointArc((-0.9124332948, 10.4513670239), (-1.1693580247, 11.8302313924), (0, 12.60475))
        make_face()
        with BuildLine():
            ThreePointArc((1.27, 11.33475), (0.8980256121, 12.2327756121), (0, 12.60475))
            Line((0, 12.60475), (0, 10.06475))
            ThreePointArc((0, 10.06475), (0.4954814184, 10.1653919864), (0.9124333342, 10.4513670646))
            ThreePointArc((0.9124333342, 10.4513670646), (1.177219252, 10.8582472899), (1.27, 11.33475))
        make_face()
        with BuildLine():
            Line((0, 10.06475), (0, 12.60475))
            ThreePointArc((0, 12.60475), (-1.1693580247, 11.8302313924), (-0.9124332948, 10.4513670239))
            ThreePointArc((-0.9124332948, 10.4513670239), (-0.4954813924, 10.1653919753), (0, 10.06475))
        make_face()
    extrude(amount=F6_DEPTH)


solid = f1.part
